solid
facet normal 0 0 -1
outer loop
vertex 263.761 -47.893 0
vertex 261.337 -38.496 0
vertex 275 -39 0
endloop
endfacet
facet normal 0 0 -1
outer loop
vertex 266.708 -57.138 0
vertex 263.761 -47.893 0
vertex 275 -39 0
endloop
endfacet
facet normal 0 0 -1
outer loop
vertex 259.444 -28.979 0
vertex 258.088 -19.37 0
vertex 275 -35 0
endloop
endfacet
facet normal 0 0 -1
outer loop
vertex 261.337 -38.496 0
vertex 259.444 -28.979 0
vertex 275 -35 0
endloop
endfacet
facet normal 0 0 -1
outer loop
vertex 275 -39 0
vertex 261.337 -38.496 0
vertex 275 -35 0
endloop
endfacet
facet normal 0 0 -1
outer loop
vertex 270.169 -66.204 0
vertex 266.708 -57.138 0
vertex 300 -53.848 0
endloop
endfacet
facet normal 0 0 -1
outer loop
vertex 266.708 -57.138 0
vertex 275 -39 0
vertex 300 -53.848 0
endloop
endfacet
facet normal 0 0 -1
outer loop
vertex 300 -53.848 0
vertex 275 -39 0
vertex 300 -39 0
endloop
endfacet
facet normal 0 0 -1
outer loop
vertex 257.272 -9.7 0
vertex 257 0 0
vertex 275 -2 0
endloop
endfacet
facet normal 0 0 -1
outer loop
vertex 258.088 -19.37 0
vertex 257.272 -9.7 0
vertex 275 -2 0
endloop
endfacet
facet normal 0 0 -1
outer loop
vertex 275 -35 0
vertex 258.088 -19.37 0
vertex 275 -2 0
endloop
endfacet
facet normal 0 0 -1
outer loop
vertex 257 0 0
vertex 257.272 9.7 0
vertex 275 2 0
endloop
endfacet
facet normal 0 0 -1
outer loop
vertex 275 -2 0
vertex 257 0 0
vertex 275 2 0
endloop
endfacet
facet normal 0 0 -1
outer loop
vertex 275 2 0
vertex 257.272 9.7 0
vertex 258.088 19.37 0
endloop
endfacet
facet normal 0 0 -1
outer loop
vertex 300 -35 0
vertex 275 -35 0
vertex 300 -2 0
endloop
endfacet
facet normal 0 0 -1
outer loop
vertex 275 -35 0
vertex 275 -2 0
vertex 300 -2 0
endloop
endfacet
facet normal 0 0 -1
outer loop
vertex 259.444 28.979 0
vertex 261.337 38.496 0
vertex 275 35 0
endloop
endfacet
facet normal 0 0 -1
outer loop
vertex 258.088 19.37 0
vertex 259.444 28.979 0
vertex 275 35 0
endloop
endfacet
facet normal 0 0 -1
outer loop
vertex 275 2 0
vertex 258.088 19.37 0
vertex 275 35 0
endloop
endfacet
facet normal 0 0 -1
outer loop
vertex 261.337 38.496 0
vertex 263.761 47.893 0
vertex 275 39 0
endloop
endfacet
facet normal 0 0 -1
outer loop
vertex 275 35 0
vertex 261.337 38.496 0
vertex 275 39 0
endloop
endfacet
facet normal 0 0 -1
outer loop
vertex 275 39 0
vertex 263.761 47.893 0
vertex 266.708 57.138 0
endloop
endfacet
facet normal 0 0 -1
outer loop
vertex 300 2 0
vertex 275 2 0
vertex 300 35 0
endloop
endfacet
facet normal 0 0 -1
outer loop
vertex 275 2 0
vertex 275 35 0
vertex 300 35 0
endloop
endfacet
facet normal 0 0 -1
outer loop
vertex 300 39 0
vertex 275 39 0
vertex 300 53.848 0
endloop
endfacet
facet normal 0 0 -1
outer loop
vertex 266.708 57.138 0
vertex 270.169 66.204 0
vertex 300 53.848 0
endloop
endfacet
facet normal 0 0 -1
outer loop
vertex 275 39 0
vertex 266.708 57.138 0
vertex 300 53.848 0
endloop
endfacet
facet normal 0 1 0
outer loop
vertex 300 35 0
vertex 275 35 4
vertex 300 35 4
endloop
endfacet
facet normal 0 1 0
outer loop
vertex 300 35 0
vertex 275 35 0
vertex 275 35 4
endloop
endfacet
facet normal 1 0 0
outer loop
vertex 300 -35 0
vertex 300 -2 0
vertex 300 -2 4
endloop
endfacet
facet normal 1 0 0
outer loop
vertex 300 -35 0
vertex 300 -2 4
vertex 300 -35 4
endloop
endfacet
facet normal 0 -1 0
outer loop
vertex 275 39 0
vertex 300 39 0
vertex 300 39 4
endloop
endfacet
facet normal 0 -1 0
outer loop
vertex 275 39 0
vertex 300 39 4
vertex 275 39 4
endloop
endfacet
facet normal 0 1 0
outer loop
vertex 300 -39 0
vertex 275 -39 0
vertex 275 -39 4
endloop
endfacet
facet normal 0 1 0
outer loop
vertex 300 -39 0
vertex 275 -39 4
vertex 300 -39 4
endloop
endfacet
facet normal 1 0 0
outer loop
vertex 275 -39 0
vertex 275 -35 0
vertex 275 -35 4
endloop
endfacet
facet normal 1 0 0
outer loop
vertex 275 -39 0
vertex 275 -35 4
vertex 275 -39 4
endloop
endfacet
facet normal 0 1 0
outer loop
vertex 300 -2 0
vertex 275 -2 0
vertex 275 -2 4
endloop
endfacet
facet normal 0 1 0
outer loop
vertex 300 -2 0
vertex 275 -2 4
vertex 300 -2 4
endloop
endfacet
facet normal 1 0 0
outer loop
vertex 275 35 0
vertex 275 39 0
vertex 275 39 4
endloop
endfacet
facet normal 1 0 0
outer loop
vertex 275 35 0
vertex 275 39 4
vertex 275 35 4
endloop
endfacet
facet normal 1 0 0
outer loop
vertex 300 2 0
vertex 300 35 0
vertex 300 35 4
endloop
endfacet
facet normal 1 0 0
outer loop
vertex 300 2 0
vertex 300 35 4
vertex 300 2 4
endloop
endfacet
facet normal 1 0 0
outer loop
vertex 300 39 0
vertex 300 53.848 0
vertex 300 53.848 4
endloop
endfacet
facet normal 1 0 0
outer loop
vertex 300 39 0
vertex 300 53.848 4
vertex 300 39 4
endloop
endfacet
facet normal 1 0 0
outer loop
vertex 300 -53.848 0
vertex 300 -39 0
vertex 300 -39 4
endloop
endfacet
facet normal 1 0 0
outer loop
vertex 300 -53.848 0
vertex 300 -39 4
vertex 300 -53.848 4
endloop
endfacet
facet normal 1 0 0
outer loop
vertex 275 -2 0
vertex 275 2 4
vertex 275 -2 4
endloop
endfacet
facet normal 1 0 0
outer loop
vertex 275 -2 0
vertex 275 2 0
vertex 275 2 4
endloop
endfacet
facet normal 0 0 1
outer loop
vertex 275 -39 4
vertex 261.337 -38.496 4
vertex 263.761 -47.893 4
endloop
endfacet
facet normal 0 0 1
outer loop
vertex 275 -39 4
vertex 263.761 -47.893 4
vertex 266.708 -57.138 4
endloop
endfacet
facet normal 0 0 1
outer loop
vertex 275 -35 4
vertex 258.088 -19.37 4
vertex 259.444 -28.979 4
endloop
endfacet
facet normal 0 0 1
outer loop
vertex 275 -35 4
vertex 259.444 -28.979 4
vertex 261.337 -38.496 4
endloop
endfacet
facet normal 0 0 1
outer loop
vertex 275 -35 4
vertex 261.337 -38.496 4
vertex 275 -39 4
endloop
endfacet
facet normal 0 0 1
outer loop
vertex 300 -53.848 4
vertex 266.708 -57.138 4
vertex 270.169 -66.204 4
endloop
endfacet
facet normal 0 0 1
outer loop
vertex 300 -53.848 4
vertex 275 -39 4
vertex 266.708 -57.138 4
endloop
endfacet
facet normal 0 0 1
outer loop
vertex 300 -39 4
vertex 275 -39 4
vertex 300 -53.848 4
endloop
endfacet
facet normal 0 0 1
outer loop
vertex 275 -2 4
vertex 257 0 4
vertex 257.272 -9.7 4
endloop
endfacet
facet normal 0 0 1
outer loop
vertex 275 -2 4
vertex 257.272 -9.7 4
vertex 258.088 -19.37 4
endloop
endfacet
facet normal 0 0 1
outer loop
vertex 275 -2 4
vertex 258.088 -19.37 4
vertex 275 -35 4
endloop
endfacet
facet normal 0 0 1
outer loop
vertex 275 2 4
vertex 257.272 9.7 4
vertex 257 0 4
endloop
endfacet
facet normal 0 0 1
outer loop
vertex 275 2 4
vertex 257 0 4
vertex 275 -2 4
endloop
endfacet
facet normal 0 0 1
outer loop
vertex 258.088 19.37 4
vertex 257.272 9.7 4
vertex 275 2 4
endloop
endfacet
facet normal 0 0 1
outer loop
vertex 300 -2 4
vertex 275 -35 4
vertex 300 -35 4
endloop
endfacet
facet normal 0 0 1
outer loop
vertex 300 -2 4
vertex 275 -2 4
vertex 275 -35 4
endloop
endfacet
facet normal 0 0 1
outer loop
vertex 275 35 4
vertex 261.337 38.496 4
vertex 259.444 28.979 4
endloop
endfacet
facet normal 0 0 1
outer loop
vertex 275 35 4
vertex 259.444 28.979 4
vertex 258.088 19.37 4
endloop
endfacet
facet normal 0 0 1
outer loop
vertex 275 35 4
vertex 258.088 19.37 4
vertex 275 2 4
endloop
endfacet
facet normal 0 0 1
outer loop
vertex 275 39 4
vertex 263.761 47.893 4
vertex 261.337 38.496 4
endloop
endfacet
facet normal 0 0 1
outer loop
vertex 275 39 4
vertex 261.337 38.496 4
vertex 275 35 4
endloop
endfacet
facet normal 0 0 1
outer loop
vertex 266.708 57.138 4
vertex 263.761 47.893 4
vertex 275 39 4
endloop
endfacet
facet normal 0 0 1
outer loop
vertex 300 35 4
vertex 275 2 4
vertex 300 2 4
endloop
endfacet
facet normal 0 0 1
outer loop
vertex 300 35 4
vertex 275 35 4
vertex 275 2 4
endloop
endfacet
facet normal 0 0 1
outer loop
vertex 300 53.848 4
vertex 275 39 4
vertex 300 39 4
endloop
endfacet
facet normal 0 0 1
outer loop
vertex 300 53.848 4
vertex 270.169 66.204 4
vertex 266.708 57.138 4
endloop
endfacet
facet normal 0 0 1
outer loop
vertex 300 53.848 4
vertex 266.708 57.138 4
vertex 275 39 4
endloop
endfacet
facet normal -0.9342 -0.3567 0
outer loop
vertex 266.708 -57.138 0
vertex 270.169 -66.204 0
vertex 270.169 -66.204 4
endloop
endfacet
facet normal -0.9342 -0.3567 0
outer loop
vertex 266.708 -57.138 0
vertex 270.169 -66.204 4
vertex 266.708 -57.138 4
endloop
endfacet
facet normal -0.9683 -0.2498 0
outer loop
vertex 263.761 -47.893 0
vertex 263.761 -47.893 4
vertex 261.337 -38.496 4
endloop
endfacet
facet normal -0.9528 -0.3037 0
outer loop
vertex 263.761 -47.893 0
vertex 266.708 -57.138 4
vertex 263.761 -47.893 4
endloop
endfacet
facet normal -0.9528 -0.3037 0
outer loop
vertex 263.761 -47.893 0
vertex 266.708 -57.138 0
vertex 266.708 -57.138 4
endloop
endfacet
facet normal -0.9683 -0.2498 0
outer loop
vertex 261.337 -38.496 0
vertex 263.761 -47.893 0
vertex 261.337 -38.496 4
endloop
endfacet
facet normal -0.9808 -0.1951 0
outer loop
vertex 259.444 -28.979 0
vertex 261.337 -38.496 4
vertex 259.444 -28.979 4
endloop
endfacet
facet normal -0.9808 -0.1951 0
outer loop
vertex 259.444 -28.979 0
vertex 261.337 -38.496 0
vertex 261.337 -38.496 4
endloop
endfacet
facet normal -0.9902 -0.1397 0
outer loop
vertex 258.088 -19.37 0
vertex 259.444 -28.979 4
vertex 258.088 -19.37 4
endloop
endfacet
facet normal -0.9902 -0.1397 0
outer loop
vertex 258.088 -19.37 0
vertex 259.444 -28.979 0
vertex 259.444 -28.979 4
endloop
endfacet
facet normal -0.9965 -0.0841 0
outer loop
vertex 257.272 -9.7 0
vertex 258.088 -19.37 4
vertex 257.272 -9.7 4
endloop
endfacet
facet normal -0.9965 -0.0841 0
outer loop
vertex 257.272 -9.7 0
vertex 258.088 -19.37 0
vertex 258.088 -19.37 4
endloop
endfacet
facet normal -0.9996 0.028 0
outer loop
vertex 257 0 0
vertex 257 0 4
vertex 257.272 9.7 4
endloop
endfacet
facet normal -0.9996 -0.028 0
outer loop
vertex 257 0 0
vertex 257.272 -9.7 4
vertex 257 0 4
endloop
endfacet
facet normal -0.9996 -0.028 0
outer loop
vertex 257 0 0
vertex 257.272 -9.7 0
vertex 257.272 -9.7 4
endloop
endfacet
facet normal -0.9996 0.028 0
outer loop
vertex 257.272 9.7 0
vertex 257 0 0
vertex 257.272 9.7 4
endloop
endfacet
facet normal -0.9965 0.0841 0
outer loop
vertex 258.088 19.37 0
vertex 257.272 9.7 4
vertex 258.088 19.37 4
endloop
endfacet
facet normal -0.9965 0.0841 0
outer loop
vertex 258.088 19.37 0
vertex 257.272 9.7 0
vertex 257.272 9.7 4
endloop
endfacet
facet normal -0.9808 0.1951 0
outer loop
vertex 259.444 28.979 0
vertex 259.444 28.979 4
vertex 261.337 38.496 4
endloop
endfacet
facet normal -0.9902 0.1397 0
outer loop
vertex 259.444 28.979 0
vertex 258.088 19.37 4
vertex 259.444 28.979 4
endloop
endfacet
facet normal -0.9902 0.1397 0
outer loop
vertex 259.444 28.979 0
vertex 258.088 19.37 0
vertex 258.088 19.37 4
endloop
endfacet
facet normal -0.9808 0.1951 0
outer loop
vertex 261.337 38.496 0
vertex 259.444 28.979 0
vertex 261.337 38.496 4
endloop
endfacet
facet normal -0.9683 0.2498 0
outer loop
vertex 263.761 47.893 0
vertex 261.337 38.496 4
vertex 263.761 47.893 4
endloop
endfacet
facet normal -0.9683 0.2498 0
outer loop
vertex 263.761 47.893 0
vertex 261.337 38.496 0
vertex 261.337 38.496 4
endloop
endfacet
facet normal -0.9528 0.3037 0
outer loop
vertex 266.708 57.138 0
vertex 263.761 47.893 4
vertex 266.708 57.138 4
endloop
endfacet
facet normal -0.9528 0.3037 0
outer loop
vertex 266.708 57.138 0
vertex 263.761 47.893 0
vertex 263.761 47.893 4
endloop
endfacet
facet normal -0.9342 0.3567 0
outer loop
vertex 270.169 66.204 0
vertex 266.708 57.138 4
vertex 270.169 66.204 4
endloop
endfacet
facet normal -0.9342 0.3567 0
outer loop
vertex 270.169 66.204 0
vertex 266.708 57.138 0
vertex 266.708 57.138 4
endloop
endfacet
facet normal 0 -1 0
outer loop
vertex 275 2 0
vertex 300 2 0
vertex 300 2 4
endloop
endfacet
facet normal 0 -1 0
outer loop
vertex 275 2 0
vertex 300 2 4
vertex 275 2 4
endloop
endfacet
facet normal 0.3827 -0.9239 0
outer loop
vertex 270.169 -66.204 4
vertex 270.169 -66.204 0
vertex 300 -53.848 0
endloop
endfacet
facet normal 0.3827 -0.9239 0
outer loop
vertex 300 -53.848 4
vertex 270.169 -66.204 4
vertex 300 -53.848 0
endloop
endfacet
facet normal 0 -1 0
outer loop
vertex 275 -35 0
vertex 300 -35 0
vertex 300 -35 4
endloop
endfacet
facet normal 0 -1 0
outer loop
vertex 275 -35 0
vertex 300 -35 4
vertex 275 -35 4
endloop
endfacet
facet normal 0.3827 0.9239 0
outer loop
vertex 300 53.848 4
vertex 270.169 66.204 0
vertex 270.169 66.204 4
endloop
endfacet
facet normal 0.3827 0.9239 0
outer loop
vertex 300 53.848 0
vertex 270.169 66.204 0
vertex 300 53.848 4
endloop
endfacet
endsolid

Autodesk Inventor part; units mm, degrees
ref_plane "YZ Plane" through (0, 0, 0) normal (1, 0, 0) x (0, 1, 0)
ref_plane "XZ Plane" through (0, 0, 0) normal (0, 1, 0) x (-1, 0, 0)
ref_plane "Work Plane1" through (0, 0, 0) normal (0, 0, 1) x (1, 0, 0)
sketch "Sketch1" plane through (0, 0, 0) normal (0, 0, 1) x (1, 0, 0)
  line L0 (300, 300) -> (-300, 300) construction
  line L1 (-300, 300) -> (-300, -300) construction
  line L2 (-300, -300) -> (300, -300) construction
  line L3 (300, -300) -> (300, 300) construction
  line L4 (300, -53.8478) -> (-254.3277, -283.4578) construction
  arc A0 (269.6349, -64.9002) -> (269.6349, -64.9002) centre (430, 0) ccw construction
  arc A1 (269.2287, 63.8872) -> (269.6349, -64.9002) centre (430, 0) ccw construction
  arc A2 (269.2287, 63.8872) -> (269.2287, 63.8872) centre (430, 0) ccw construction
  line L5 (-254.3277, 283.4578) -> (300, 53.8478) construction
  line L6 (300, 53.8478) -> (300, -53.8478)
  line L7 (270.1688, -66.2042) -> (300, -53.8478)
  line L8 (270.1688, 66.2042) -> (300, 53.8478)
  arc A3 (270.1688, 66.2042) -> (270.1688, -66.2042) centre (430, 0) ccw
  line L9 (300, -35) -> (275, -35)
  line L10 (275, -35) -> (275, -39)
  line L11 (275, -39) -> (300, -39)
  line L12 (300, -39) -> (300, -35)
  line L13 (300, 2) -> (275, 2)
  line L14 (275, 2) -> (275, -2)
  line L15 (275, -2) -> (300, -2)
  line L16 (300, -2) -> (300, 2)
  line L17 (300, 39) -> (275, 39)
  line L18 (275, 39) -> (275, 35)
  line L19 (275, 35) -> (300, 35)
  line L20 (300, 35) -> (300, 39)
  point P0 (0, 0)
  point P1 (300, 0)
  dimension "d2" = 25
  dimension "d3" = 4
  dimension "d4" = 25
  dimension "d5" = 4
  dimension "d6" = 25
  dimension "d7" = 4
  dimension "d8" = 35
  dimension "d9" = 35
extrude "Extrusion2" add sketch "Sketch1" along normal blind 4 contours L6 L17 L18 L19 L13 L14 L15 L9 L10 L11 L7 A3 L8
equation "\"d3\" = d7"
equation "\"d5\" = d7"
properties part number "frontformer" material "Wood (Cherry)"
